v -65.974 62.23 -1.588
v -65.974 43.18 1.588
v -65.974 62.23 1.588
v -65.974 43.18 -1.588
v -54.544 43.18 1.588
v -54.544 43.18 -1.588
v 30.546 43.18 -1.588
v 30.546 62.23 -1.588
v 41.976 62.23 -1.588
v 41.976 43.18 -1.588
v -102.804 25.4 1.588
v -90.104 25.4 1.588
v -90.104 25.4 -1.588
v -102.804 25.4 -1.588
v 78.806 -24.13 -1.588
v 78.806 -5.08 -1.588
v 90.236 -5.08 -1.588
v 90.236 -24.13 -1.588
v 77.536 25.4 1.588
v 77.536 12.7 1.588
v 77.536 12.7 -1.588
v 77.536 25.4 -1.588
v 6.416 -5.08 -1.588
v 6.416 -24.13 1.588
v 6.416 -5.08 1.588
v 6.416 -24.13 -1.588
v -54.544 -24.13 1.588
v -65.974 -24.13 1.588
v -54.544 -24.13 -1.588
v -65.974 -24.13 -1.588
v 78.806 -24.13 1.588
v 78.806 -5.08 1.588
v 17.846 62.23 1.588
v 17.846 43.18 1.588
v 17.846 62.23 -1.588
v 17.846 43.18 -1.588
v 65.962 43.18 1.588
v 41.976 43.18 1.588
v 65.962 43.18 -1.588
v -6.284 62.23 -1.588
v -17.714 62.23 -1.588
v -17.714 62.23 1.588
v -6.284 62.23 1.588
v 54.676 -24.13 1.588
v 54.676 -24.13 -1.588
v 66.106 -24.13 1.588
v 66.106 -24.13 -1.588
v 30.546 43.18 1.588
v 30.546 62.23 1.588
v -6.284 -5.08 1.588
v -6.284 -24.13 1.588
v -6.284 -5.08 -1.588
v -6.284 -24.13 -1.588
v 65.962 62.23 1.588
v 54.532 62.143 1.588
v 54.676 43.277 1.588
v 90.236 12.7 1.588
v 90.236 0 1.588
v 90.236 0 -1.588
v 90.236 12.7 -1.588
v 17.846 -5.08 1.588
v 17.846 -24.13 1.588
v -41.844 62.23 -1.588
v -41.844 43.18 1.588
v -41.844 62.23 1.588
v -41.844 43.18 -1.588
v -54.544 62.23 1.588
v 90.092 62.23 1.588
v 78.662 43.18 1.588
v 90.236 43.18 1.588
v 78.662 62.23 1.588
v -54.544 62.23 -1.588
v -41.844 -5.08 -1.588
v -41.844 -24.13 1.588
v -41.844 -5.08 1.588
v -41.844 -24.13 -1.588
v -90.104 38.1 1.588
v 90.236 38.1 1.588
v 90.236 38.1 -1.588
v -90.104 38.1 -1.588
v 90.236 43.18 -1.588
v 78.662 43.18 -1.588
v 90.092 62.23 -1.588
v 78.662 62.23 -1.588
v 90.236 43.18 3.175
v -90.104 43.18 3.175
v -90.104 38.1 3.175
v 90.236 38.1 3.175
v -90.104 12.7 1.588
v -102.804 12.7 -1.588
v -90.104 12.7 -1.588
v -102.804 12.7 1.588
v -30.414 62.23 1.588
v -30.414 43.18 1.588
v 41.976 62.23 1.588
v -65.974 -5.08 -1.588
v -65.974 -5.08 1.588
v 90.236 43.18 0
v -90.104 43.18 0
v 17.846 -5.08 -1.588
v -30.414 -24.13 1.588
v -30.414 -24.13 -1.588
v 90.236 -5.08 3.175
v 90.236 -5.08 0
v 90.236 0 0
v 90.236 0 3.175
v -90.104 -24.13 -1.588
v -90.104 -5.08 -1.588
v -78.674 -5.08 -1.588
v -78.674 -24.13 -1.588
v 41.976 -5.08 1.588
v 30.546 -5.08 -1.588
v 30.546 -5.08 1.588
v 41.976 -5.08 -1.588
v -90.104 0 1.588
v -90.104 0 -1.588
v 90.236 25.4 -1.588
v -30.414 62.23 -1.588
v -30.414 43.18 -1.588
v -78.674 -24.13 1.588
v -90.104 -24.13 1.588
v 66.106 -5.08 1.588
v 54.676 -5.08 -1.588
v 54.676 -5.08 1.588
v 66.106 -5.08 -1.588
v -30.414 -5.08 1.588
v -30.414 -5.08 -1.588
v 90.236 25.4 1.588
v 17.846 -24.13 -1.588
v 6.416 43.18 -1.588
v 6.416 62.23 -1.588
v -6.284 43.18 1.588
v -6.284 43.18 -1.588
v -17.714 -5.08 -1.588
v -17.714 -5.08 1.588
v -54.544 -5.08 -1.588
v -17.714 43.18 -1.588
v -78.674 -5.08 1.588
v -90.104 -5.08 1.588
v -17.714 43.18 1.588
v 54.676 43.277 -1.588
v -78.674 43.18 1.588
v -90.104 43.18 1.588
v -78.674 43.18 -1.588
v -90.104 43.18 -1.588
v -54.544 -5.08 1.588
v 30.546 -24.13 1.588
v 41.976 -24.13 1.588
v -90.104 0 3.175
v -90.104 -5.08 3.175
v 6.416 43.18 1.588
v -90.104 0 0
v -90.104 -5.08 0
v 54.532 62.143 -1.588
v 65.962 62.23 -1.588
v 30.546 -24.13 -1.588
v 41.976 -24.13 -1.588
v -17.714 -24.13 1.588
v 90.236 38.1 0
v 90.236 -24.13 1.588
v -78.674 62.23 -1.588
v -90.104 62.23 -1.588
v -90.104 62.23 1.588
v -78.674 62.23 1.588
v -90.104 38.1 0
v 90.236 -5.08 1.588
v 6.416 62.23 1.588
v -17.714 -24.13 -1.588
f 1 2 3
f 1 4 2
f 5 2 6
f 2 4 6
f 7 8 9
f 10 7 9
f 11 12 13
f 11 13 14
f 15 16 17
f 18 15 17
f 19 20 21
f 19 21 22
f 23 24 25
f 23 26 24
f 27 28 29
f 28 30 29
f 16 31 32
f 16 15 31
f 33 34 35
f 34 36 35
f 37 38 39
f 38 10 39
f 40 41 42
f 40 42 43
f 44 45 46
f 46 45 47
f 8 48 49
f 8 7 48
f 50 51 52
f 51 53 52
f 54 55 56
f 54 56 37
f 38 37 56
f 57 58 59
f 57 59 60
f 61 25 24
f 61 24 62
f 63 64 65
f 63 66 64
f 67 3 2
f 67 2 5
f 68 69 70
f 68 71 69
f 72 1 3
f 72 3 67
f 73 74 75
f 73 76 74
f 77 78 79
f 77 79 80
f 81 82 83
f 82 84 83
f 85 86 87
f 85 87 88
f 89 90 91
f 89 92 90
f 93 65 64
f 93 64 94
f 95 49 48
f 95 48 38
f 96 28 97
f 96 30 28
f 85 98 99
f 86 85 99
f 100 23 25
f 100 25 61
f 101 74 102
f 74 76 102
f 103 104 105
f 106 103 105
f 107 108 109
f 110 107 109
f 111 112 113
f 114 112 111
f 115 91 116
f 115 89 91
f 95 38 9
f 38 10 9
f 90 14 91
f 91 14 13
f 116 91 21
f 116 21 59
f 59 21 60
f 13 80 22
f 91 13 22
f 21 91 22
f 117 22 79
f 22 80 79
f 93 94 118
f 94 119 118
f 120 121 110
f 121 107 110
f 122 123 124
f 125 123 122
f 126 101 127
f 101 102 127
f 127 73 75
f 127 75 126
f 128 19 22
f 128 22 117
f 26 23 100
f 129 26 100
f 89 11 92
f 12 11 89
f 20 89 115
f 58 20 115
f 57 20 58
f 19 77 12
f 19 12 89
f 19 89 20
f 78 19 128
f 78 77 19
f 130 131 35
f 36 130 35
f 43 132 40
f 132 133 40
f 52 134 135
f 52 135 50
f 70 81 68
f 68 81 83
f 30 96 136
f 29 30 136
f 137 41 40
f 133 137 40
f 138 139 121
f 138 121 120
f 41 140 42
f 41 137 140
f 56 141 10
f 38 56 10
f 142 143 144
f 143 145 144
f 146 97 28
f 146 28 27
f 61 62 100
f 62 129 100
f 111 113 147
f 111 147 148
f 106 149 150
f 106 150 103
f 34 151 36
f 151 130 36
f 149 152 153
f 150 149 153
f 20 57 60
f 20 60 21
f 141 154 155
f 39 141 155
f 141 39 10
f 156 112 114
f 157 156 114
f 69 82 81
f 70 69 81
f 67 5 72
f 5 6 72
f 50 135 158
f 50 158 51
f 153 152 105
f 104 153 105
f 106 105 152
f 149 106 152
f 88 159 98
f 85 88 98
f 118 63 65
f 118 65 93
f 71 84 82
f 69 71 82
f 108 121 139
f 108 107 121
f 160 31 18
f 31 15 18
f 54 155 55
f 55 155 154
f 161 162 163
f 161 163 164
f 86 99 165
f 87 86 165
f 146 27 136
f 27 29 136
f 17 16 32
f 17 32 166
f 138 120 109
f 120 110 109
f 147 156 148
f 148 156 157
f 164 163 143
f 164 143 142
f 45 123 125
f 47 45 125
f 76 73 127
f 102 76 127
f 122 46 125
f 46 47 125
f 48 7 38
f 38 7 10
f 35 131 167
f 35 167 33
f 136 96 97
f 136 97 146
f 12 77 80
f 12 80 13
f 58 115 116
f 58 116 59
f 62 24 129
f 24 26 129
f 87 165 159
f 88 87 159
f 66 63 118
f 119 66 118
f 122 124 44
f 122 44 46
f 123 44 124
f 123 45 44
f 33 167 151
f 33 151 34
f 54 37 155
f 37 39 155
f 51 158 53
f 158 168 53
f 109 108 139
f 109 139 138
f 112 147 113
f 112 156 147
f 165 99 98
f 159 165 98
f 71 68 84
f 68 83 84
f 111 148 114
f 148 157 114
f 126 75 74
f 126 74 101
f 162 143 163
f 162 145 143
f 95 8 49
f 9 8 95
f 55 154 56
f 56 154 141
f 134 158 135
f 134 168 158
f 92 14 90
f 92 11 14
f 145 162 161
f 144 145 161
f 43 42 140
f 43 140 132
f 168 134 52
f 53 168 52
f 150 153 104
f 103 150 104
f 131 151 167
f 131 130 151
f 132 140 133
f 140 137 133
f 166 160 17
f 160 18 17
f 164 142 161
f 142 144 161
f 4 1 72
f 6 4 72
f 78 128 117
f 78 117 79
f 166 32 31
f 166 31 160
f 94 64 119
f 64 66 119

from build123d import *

# Parameters (mm, degrees)
F0_W     = 11.43
F0_H     = 19.05
F1_DEPTH = 1.5875
F2_DEPTH = 3.175


with BuildPart() as f1:
    # F0 (on Top) → F1 (new body, symmetric)
    with BuildSketch(Plane.XY):
        with Locations((-84.38909, 52.705)):
            Rectangle(F0_W, F0_H)
        with Locations((-60.25909, 52.705)):
            Rectangle(F0_W, F0_H)
        with Locations((-36.12909, 52.705)):
            Rectangle(F0_W, F0_H)
        with Locations((-11.99909, 52.705)):
            Rectangle(F0_W, F0_H)
        with Locations((12.13091, 52.705)):
            Rectangle(F0_W, F0_H)
        with Locations((36.26091, 52.705)):
            Rectangle(F0_W, F0_H)
        Polygon((41.97591, 43.18), (65.961873, 43.18), (65.961873, 62.23), (54.531873, 62.142734), (54.67591, 43.276962), align=None)
        Polygon((78.661873, 43.18), (90.23591, 43.18), (90.091873, 62.23), (78.661873, 62.23), align=None)
        with Locations((84.52091, -14.605)):
            Rectangle(F0_W, F0_H)
        with Locations((60.39091, -14.605)):
            Rectangle(F0_W, F0_H)
        with Locations((36.26091, -14.605)):
            Rectangle(F0_W, F0_H)
        with Locations((12.13091, -14.605)):
            Rectangle(F0_W, F0_H)
        with Locations((-11.99909, -14.605)):
            Rectangle(F0_W, F0_H)
        with Locations((-36.12909, -14.605)):
            Rectangle(F0_W, F0_H)
        with Locations((-60.25909, -14.605)):
            Rectangle(F0_W, F0_H)
        with Locations((-84.38909, -14.605)):
            Rectangle(F0_W, F0_H)
        Polygon((-90.10409, 12.7), (-90.10409, 0), (90.23591, 0), (90.23591, 12.7), (77.53591, 12.7), (77.53591, 25.4), (90.23591, 25.4), (90.23591, 38.1), (-90.10409, 38.1), (-90.10409, 25.4), (-102.80409, 25.4), (-102.80409, 12.7), align=None)
    extrude(amount=F1_DEPTH, both=True)


with BuildPart() as f2:
    # F0 (on Top) → F2 (new body)
    with BuildSketch(Plane.XY):
        Polygon((-90.10409, 43.18), (-90.10409, 38.1), (90.23591, 38.1), (90.23591, 43.18), (78.661873, 43.18), (65.961873, 43.18), (41.97591, 43.18), (30.54591, 43.18), (17.84591, 43.18), (6.41591, 43.18), (-6.28409, 43.18), (-17.71409, 43.18), (-30.41409, 43.18), (-41.84409, 43.18), (-54.54409, 43.18), (-65.97409, 43.18), (-78.67409, 43.18), align=None)
        Polygon((-90.10409, 0), (-90.10409, -5.08), (-78.67409, -5.08), (-78.653193, -5.08), (-65.97409, -5.08), (-54.54409, -5.08), (-41.84409, -5.08), (-30.41409, -5.08), (-17.71409, -5.08), (-6.28409, -5.08), (6.41591, -5.08), (17.84591, -5.08), (30.54591, -5.08), (41.97591, -5.08), (54.67591, -5.08), (66.10591, -5.08), (78.80591, -5.08), (90.23591, -5.08), (90.23591, 0), align=None)
    extrude(amount=F2_DEPTH)


solid = Compound([f1.part, f2.part])
